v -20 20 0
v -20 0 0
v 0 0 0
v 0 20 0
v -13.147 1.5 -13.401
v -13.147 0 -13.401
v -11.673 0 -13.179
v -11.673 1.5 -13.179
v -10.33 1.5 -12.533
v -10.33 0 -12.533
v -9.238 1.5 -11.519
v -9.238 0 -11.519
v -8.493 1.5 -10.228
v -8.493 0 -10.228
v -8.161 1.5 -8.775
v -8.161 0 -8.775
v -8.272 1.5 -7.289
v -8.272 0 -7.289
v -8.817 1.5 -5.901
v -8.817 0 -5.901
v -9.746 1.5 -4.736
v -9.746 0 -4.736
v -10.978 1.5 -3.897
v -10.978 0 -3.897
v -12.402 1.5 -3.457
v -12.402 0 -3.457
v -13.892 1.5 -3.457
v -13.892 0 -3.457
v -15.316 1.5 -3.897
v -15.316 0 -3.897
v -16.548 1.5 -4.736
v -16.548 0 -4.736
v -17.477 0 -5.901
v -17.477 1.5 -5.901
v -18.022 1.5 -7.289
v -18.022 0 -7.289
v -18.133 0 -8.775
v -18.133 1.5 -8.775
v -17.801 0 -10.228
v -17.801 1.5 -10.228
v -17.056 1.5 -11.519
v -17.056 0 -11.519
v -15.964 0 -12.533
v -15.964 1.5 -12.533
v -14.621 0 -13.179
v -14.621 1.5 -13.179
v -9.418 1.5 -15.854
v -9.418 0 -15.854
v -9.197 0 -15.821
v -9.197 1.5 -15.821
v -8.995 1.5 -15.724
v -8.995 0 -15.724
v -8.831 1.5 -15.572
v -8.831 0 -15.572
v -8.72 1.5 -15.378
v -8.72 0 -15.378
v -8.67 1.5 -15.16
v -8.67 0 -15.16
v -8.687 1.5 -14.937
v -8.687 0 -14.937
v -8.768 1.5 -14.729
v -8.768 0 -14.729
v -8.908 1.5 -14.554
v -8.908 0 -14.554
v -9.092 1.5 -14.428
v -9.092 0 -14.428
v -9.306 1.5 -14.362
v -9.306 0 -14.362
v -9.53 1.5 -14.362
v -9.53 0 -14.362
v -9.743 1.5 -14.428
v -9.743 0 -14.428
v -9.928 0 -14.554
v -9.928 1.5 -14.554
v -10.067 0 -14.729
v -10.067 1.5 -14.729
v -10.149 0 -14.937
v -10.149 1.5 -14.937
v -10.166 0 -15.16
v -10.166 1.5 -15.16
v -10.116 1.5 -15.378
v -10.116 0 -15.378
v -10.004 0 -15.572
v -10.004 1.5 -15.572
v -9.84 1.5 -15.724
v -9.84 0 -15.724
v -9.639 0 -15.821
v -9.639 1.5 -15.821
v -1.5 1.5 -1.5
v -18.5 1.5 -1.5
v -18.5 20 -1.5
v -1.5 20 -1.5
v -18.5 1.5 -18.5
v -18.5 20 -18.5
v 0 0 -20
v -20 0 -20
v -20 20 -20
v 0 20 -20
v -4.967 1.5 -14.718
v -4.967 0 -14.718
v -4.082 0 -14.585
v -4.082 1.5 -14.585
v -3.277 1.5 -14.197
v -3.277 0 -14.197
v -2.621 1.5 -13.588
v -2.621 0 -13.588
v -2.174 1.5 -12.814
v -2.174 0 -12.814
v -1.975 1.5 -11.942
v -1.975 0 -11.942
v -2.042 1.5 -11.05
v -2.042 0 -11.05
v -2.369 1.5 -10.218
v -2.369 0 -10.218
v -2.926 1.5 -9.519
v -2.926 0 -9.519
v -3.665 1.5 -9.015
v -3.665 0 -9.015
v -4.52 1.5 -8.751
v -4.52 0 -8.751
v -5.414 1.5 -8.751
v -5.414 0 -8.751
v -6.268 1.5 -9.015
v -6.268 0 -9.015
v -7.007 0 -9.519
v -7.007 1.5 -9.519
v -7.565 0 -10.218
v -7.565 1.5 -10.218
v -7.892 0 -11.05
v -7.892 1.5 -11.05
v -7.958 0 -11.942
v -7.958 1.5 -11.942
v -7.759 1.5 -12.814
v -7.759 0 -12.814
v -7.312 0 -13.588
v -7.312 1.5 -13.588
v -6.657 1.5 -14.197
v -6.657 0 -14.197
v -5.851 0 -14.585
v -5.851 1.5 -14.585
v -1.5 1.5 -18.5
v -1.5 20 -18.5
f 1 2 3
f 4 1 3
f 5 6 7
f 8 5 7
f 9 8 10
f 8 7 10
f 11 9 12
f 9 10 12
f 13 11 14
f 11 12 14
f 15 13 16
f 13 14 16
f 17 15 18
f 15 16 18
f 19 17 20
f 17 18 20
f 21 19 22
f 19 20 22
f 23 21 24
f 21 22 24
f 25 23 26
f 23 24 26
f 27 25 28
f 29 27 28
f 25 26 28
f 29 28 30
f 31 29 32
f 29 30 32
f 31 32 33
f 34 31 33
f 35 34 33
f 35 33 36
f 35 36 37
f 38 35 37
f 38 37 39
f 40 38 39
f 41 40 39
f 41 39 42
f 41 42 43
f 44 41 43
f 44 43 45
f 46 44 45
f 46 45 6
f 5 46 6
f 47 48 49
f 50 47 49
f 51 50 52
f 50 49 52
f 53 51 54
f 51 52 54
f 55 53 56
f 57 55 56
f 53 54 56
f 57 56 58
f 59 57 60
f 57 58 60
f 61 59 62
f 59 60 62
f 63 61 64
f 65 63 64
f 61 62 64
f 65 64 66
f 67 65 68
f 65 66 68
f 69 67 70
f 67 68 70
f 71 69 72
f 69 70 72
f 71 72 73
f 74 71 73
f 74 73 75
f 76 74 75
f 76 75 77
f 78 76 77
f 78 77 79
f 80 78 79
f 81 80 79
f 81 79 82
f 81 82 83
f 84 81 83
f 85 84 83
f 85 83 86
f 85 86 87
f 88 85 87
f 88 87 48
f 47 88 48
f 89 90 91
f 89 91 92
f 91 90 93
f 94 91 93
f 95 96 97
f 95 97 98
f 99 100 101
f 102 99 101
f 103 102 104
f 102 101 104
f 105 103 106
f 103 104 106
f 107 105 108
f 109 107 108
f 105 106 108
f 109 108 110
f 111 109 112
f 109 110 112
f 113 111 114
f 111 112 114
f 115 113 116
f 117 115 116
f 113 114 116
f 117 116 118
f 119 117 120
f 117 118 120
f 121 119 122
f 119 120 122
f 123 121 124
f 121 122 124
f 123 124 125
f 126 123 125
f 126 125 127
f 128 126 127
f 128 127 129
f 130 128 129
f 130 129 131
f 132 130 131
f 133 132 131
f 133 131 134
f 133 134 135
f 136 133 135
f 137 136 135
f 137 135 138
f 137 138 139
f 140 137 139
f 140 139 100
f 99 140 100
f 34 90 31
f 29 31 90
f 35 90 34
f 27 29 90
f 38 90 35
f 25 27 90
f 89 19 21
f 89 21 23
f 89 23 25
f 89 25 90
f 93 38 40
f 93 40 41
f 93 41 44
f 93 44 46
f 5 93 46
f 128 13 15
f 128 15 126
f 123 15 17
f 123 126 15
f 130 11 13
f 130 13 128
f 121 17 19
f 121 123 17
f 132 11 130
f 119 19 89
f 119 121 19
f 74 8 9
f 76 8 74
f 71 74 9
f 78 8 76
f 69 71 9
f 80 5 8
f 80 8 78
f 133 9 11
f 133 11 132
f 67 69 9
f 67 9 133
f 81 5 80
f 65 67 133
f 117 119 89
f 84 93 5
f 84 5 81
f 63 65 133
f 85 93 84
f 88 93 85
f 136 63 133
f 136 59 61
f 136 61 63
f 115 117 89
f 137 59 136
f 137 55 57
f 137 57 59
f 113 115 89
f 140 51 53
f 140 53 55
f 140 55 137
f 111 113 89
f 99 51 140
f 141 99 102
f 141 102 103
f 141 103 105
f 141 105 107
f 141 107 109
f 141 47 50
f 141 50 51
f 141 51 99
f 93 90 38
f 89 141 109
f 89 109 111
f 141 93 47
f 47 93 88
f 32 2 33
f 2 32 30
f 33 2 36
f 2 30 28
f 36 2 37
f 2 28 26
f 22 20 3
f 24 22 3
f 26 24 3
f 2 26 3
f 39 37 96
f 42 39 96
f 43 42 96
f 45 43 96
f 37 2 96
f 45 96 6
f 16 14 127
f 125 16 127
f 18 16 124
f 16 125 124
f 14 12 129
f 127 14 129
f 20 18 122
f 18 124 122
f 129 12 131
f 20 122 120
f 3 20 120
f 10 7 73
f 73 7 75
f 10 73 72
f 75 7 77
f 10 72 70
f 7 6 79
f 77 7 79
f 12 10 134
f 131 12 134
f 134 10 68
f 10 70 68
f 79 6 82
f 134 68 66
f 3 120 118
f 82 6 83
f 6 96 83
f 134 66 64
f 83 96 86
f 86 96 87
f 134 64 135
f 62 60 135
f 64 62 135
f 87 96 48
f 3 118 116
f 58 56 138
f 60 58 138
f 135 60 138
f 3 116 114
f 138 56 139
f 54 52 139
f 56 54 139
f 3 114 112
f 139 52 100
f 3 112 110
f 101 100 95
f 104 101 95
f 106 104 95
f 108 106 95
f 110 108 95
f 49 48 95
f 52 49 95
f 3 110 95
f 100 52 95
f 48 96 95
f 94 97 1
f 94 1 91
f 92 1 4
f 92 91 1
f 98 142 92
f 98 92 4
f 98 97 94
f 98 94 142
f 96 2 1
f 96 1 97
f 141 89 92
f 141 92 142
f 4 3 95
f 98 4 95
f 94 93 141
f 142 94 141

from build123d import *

# Parameters (mm, degrees)
SKETCH1_W           = 20
SKETCH1_H           = 20
BOSS_EXTRUDE1_DEPTH = 20
SHELL1_T            = -1.5
SKETCH2_R           = 5
SKETCH2_R_2         = 0.75
SKETCH2_R_3         = 3
CUT_EXTRUDE1_DEPTH  = 35.641016151


with BuildPart() as part:
    # Sketch1 → Boss-Extrude1 (new body)
    with BuildSketch(Plane(origin=(0, 0, 0), x_dir=(1, 0, 0), z_dir=(0, 1, 0))):
        with Locations((-10, 10)):
            Rectangle(SKETCH1_W, SKETCH1_H)
    extrude(amount=BOSS_EXTRUDE1_DEPTH)

    # Shell1
    shell1_openings = [part.faces().sort_by_distance(p)[0] for p in [
        (-10, 20, -10),
    ]]
    offset(amount=SHELL1_T, openings=shell1_openings, kind=Kind.INTERSECTION)

    # Sketch2 → Cut-Extrude1 (cut, through all)
    with BuildSketch(Plane.XZ):
        with Locations(Location((-13.147042084, -8.401387365, 0), (0, 0, 270))):
            Circle(SKETCH2_R)
        with Locations(Location((-9.417853088, -15.104070699, 0), (0, 0, 270))):
            Circle(SKETCH2_R_2)
        with Locations(Location((-4.966731055, -11.717786539, 0), (0, 0, 270))):
            Circle(SKETCH2_R_3)
    extrude(amount=-CUT_EXTRUDE1_DEPTH, mode=Mode.SUBTRACT)


solid = part.part
